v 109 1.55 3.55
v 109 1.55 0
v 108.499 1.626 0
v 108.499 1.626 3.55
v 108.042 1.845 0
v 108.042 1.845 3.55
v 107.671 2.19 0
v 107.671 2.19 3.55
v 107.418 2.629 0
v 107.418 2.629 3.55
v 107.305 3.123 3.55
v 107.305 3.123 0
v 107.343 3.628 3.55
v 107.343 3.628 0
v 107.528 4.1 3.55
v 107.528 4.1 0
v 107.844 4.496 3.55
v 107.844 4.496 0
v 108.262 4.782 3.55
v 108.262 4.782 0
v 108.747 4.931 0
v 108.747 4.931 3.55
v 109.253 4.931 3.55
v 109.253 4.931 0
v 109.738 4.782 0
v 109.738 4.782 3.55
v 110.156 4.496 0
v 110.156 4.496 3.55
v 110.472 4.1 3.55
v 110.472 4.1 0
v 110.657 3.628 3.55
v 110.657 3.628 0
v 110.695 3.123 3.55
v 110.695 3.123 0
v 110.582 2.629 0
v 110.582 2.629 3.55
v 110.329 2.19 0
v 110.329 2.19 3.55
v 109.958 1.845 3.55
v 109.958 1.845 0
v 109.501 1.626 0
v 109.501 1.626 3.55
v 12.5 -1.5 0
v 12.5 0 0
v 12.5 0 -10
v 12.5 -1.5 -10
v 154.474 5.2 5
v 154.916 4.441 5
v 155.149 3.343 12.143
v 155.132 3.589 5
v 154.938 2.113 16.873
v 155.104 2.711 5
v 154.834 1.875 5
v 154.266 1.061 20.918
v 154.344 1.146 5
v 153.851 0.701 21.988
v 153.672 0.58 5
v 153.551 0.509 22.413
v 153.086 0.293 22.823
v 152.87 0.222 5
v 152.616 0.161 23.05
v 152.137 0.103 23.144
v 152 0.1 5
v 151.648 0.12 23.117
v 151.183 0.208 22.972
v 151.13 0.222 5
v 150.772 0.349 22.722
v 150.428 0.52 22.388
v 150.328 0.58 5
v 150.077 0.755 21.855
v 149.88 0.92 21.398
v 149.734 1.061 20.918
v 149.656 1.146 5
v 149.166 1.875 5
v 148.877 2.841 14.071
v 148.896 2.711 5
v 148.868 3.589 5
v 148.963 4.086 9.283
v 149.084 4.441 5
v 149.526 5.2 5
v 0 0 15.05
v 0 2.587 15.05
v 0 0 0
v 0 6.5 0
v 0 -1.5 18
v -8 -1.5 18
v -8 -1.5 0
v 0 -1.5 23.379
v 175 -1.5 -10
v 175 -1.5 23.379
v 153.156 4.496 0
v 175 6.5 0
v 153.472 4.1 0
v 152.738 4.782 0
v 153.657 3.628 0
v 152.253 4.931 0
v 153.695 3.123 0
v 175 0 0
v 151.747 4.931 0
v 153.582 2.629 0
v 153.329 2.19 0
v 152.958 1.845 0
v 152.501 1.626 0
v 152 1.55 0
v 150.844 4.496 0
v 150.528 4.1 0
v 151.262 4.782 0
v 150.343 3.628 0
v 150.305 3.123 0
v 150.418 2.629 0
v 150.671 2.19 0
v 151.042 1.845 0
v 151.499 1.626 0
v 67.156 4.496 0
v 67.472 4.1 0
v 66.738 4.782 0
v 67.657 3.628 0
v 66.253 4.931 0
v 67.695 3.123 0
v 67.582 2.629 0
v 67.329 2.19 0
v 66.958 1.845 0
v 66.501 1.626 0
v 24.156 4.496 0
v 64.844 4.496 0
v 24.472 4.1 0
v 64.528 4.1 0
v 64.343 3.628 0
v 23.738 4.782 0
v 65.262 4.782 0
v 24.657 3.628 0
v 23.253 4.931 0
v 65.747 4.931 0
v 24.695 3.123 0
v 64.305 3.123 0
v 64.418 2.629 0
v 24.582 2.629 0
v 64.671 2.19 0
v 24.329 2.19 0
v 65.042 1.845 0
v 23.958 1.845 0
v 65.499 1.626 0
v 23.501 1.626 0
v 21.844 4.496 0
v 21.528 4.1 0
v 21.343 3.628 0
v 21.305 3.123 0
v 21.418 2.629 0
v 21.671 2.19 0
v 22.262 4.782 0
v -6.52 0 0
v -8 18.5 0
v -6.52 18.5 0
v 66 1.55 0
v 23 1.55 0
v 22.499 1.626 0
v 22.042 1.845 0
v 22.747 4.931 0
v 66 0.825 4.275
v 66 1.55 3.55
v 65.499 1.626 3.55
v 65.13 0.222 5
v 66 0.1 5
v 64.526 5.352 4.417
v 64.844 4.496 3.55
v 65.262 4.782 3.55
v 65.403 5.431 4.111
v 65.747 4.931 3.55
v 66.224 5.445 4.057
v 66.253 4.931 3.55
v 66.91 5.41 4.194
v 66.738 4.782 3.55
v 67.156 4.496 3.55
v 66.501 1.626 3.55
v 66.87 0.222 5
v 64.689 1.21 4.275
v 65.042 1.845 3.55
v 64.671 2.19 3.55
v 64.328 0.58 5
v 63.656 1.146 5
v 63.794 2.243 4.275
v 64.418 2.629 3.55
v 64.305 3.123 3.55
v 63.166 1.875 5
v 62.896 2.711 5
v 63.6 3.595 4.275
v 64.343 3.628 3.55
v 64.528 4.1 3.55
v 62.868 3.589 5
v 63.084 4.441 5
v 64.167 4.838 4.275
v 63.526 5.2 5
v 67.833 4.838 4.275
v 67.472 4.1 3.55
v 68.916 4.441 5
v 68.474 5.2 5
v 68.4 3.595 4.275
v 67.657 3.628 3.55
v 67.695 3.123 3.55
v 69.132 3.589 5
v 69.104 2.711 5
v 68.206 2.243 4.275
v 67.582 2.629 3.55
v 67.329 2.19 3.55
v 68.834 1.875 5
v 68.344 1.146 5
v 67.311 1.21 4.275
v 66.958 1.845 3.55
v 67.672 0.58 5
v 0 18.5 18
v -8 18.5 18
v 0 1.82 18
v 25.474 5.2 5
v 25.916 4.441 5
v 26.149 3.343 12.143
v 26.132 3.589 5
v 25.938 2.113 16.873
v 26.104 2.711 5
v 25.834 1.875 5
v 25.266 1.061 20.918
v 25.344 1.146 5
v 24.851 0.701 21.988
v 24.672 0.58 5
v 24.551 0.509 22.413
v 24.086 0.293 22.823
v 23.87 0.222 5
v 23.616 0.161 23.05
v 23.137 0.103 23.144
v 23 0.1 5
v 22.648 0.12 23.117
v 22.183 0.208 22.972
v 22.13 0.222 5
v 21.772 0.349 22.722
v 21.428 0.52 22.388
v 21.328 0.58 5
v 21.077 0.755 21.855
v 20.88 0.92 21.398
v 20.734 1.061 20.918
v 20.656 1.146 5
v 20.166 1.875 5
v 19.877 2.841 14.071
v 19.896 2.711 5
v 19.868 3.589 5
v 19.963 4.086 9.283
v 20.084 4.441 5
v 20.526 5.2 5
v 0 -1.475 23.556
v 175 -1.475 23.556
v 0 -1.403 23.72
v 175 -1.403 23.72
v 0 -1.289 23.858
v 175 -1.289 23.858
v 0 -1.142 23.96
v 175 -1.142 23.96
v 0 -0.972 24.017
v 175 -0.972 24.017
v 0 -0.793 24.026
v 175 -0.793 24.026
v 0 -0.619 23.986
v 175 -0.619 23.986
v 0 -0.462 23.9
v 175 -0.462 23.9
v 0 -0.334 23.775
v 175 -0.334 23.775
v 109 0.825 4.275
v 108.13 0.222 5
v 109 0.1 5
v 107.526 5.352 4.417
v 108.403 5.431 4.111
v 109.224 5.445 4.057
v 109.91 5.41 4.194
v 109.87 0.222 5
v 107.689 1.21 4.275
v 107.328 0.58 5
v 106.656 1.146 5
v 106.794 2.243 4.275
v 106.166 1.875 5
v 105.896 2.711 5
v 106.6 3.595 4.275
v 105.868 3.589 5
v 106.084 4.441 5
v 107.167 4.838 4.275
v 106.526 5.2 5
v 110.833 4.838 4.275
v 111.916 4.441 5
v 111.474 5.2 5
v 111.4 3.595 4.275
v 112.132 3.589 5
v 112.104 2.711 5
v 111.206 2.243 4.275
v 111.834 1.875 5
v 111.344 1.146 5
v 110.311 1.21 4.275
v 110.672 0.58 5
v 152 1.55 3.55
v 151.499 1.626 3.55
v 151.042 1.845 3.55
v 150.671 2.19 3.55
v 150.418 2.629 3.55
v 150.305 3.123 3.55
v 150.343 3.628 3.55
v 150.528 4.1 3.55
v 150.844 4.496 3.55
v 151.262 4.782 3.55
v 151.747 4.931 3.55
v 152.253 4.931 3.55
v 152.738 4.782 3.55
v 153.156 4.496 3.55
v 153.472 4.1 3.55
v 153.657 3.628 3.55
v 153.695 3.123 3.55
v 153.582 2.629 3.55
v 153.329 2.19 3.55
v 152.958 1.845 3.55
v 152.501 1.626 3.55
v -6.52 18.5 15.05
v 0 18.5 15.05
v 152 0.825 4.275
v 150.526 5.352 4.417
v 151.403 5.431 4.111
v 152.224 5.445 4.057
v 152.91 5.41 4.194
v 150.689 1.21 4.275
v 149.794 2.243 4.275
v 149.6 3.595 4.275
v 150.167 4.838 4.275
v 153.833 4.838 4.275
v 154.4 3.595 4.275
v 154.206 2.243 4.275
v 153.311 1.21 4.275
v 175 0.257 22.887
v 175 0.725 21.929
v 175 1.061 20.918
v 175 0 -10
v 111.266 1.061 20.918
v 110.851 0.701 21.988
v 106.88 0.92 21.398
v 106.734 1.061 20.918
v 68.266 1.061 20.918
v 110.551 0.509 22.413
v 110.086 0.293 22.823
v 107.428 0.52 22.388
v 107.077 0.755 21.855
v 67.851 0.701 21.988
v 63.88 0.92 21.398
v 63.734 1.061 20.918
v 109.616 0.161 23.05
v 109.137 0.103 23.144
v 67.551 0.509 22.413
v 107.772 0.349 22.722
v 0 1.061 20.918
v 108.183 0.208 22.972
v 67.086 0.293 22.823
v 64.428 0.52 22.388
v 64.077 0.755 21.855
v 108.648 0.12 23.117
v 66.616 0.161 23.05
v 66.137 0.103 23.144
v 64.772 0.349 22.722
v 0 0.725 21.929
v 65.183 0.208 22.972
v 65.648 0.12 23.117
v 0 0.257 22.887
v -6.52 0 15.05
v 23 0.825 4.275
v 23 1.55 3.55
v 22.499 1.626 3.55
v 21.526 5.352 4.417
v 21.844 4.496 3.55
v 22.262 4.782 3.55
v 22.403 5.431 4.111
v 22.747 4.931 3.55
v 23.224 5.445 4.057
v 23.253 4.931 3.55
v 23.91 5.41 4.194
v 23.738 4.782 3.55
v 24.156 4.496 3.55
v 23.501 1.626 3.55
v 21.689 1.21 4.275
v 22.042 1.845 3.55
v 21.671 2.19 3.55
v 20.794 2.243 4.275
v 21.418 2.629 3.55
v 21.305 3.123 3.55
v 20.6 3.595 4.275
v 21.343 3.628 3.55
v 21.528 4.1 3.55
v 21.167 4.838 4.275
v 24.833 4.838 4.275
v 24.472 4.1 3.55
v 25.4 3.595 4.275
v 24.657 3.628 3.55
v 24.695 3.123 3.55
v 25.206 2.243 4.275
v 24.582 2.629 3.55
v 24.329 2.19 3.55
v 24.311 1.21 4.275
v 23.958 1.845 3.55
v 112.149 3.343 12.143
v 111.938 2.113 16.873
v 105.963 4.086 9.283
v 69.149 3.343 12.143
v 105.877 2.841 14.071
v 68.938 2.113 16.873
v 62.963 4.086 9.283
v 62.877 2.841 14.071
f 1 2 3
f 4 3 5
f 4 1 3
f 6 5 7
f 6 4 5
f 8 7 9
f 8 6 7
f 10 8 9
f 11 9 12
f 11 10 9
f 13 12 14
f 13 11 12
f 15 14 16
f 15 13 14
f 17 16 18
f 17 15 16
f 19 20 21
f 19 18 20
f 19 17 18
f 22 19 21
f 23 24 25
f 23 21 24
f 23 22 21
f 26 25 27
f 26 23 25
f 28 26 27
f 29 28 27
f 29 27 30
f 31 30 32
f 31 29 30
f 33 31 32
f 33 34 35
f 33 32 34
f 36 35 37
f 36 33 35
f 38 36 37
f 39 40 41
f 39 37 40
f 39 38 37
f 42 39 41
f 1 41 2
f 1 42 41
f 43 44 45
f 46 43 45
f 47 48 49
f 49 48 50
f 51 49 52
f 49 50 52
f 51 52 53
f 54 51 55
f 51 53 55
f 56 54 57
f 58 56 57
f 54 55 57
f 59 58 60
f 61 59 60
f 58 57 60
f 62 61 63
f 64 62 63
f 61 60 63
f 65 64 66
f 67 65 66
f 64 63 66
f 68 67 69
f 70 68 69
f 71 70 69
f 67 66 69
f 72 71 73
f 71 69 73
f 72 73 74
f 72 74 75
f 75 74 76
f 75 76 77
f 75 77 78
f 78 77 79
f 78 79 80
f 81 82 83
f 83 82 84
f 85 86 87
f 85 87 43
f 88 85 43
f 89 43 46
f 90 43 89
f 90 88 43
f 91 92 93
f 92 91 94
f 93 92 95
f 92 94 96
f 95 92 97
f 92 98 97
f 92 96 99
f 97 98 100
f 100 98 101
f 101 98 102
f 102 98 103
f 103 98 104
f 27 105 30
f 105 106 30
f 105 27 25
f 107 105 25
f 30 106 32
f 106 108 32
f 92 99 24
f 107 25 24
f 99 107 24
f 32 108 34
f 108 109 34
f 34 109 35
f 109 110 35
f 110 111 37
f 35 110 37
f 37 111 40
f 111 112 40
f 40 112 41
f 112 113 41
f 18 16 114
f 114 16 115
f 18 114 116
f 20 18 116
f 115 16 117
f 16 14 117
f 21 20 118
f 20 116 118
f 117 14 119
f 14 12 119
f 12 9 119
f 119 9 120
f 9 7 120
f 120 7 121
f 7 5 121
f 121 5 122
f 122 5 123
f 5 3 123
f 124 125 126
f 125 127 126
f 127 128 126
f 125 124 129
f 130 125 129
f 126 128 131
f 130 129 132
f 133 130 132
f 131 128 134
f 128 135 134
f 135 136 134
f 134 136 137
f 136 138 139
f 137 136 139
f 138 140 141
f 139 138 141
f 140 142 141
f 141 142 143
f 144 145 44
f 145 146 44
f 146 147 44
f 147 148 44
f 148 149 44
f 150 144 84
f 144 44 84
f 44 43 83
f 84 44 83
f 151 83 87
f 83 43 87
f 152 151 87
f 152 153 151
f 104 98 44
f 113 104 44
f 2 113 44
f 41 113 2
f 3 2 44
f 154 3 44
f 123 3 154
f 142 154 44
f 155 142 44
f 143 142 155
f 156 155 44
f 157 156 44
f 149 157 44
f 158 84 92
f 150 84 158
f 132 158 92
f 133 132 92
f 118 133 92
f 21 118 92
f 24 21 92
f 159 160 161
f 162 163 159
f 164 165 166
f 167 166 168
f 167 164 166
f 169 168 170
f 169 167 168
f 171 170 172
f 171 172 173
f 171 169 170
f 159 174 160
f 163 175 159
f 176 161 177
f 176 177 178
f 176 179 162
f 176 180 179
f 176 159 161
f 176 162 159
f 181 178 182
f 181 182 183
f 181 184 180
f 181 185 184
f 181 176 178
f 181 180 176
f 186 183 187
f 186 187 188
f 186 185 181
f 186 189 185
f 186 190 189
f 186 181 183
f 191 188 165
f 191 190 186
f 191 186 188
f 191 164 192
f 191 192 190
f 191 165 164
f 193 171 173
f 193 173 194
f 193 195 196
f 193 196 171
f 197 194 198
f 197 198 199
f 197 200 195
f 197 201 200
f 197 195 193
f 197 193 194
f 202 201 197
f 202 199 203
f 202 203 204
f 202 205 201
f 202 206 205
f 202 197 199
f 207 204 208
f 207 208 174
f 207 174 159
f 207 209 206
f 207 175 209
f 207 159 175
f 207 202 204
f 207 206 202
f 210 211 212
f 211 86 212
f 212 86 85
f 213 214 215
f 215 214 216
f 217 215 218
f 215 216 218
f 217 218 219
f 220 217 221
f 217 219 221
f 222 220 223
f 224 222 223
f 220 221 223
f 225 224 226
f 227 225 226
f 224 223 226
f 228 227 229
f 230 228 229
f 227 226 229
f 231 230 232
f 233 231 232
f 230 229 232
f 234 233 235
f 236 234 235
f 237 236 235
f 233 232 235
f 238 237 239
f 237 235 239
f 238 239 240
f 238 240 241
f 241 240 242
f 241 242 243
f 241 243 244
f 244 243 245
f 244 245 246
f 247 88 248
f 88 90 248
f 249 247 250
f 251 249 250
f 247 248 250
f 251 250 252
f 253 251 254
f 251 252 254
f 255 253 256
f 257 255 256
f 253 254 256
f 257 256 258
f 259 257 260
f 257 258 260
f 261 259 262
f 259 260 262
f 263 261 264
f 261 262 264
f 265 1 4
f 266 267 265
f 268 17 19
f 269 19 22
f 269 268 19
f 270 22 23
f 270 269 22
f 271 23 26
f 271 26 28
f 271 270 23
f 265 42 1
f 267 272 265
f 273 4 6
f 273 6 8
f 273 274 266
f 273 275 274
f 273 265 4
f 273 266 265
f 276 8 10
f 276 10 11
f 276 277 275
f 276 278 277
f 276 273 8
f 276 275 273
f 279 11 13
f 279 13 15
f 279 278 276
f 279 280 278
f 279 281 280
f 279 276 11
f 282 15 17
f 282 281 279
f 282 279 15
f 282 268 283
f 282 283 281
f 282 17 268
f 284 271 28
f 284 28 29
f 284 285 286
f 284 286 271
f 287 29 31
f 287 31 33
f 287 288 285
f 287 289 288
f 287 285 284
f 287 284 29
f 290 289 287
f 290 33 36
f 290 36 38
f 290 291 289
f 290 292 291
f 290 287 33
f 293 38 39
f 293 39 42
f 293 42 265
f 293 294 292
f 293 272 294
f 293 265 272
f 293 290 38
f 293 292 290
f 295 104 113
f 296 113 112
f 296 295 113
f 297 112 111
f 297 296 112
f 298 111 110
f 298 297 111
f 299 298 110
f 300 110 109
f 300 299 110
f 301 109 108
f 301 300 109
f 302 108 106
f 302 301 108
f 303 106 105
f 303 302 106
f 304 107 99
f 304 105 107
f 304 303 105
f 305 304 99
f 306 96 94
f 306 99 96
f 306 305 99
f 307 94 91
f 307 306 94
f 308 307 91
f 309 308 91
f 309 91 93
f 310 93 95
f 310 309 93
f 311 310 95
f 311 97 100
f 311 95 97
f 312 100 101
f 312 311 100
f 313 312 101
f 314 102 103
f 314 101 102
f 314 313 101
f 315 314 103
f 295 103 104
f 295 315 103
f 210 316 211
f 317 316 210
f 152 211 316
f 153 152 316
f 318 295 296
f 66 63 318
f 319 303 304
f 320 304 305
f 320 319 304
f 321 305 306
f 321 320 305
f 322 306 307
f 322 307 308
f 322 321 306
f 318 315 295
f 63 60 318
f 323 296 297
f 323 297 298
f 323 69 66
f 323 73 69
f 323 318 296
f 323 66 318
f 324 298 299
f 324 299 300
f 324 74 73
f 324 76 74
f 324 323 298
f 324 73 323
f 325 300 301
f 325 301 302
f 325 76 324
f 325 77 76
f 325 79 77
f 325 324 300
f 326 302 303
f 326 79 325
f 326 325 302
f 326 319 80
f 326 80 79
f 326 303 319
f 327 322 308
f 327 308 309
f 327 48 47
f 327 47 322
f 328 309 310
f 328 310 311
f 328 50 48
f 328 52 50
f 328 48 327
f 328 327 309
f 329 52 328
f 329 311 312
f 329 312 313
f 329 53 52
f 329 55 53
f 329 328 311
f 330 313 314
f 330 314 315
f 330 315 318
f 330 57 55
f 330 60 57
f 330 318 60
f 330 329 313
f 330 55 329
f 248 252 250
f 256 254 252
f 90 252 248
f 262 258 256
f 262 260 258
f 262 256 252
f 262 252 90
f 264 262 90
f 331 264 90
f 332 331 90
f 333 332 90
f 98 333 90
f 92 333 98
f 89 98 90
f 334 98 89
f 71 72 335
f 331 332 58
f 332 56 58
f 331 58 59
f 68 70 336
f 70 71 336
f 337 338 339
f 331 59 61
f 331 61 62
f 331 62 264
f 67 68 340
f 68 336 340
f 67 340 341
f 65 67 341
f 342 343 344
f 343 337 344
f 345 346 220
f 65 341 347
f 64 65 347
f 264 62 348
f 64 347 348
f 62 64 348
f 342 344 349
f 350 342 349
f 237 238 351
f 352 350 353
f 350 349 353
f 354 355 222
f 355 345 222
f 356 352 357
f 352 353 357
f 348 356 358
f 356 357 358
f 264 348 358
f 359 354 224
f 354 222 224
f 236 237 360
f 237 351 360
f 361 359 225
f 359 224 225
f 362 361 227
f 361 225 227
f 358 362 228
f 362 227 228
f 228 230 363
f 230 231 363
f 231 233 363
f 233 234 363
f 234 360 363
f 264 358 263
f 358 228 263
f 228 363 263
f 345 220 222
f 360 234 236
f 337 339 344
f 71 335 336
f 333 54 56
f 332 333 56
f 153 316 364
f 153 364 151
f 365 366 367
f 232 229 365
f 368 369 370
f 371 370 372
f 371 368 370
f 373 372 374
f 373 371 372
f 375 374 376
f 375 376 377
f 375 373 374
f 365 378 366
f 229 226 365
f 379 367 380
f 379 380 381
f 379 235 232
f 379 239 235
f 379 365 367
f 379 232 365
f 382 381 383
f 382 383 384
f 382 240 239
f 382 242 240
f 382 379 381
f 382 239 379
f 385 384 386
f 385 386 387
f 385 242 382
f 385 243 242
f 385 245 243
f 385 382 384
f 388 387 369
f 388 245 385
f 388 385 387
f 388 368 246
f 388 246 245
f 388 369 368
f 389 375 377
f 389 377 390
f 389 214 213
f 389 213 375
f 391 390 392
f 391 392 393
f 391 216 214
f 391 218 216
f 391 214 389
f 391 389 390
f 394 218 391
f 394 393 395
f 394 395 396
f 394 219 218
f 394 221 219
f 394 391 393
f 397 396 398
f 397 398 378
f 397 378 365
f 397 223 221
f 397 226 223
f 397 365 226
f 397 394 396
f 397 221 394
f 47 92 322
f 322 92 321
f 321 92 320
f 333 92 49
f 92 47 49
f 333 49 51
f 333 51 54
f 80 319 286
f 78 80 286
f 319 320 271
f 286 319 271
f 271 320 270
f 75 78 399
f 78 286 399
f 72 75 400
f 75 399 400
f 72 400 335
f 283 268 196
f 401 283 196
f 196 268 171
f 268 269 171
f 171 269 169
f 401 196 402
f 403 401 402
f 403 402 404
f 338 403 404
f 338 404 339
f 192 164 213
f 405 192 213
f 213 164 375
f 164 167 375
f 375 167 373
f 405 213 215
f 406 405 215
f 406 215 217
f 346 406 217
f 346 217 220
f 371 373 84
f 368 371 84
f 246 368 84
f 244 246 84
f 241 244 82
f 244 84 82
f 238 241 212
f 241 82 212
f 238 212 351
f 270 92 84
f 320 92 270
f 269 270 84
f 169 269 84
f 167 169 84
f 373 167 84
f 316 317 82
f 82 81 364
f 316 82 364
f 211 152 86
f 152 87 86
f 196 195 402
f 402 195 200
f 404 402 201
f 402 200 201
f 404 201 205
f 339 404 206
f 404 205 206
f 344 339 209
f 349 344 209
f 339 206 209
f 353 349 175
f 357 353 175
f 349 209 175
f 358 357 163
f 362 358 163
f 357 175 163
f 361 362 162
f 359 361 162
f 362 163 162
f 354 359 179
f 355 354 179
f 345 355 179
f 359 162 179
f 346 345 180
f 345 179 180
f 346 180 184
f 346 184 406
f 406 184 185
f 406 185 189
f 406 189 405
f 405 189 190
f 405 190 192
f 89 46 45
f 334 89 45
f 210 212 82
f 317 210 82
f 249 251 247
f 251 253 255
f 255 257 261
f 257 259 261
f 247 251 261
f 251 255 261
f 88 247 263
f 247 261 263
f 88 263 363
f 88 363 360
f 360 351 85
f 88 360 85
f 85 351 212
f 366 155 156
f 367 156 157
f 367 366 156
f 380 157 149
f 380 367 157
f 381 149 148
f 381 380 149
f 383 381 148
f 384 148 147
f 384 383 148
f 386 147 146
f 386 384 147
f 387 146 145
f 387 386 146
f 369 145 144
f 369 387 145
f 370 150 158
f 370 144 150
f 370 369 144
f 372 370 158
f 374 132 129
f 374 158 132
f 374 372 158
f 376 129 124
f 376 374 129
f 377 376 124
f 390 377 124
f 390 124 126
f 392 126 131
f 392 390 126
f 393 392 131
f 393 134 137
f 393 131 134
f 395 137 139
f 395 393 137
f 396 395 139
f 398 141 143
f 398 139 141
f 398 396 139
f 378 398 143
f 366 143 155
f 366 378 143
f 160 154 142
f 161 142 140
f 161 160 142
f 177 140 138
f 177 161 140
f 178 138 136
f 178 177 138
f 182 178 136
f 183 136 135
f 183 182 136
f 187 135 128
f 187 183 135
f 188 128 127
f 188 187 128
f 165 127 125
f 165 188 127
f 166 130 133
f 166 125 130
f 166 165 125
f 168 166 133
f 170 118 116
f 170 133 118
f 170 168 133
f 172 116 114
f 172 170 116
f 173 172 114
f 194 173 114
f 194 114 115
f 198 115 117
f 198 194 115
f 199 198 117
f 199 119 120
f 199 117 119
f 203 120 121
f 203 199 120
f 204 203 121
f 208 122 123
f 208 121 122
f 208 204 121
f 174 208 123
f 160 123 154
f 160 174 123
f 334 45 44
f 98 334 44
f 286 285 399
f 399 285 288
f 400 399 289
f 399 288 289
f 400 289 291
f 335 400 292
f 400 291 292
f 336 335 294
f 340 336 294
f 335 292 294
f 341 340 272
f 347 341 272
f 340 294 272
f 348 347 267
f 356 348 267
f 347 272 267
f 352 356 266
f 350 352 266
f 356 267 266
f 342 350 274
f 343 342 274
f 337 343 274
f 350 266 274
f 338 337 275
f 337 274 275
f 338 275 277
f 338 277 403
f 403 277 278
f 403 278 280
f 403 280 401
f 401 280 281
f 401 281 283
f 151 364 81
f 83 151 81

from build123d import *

# Parameters (mm, degrees)
BOSS_EXTRUDE1_DEPTH                          = 175
FILLET1_R                                    = 8
CSK_FOR_M3_COUNTERSUNK_FLAT_HEAD_SCR_2_COUNT = 2
CSK_FOR_M3_COUNTERSUNK_FLAT_HEAD_SCR_2_PITCH = 129
CSK_FOR_M3_COUNTERSUNK_FLAT_HEAD_SCR_3_COUNT = 2
CSK_FOR_M3_COUNTERSUNK_FLAT_HEAD_SCR_3_PITCH = 86
CSK_FOR_M3_COUNTERSUNK_FLAT_HEAD_SCR_4_COUNT = 2
CSK_FOR_M3_COUNTERSUNK_FLAT_HEAD_SCR_4_PITCH = 43
CUT_EXTRUDE2_DEPTH                           = 177.259042321
SKETCH8_W                                    = 12.5
SKETCH8_H                                    = 10
CUT_EXTRUDE3_DEPTH                           = 177.896156092
SKETCH10_W                                   = 8
SKETCH10_H                                   = 18
BOSS_EXTRUDE2_DEPTH                          = 1.5
BOSS_EXTRUDE3_DEPTH                          = 18.5
FILLET2_R                                    = 0.65


with BuildPart() as part:
    # Sketch1 → Boss-Extrude1 (new body)
    with BuildSketch(Plane(origin=(0, 0, 0), x_dir=(0, 0, -1), z_dir=(1, 0, 0))):
        Polygon((0, 6.5), (-25, 0), (-25, -1.5), (10, -1.5), (10, 0), (0, 0), align=None)
    extrude(amount=BOSS_EXTRUDE1_DEPTH)

    # Fillet1
    # the kernel refuses this fillet: 8 mm, written as the material it takes off along each edge
    with BuildSketch(Plane(origin=(-10.545555265, 0, 25), x_dir=(0, 0.2516338517649508, -0.967822506788272), z_dir=(1, 0, 0))) as fillet1_piece_1:
        with BuildLine():
            CenterArc((4.218222106, -8), FILLET1_R, 90, 35.061762164)
            Line((-0.377450778, -1.45173376), (-0.469364235, -1.320768435))
            ThreePointArc((-0.469364235, -1.320768435), (-0.34357699, -0.685605464), (-0.154851601, 0.040261416))
            Line((-0.154851601, 0.040261416), (0, 0.16))
            Line((0, 0.16), (4.218222106, 0.16))
            Line((4.218222106, 0.16), (4.218222106, 0))
        make_face()
    extrude(amount=196.091110529, mode=Mode.SUBTRACT)

    # Sketch5 → CSK for M3 Countersunk Flat Head Screw1 (revolve, cut)
    with BuildSketch(Plane(origin=(152, 3.25, 5), x_dir=(0, -1, 0), z_dir=(1, 0, 0))):
        Polygon((0, 0), (0, 15), (1.7, 15), (1.7, 1.45), (3.15, 0), align=None)
    csk_for_m3_countersunk_flat_head_screw1 = revolve(axis=Axis((152, 3.25, 11.35), (0, 0, -1)), mode=Mode.SUBTRACT)

    # CSK for M3 Countersunk Flat Head Scr 2: CSK for M3 Countersunk Flat Head Screw1 ×2
    with Locations(*[(-i * CSK_FOR_M3_COUNTERSUNK_FLAT_HEAD_SCR_2_PITCH, 0, 0) for i in range(1, CSK_FOR_M3_COUNTERSUNK_FLAT_HEAD_SCR_2_COUNT)]):
        add(csk_for_m3_countersunk_flat_head_screw1, mode=Mode.SUBTRACT)

    # CSK for M3 Countersunk Flat Head Scr 3: CSK for M3 Countersunk Flat Head Screw1 ×2
    with Locations(*[(-i * CSK_FOR_M3_COUNTERSUNK_FLAT_HEAD_SCR_3_PITCH, 0, 0) for i in range(1, CSK_FOR_M3_COUNTERSUNK_FLAT_HEAD_SCR_3_COUNT)]):
        add(csk_for_m3_countersunk_flat_head_screw1, mode=Mode.SUBTRACT)

    # CSK for M3 Countersunk Flat Head Scr 4: CSK for M3 Countersunk Flat Head Screw1 ×2
    with Locations(*[(-i * CSK_FOR_M3_COUNTERSUNK_FLAT_HEAD_SCR_4_PITCH, 0, 0) for i in range(1, CSK_FOR_M3_COUNTERSUNK_FLAT_HEAD_SCR_4_COUNT)]):
        add(csk_for_m3_countersunk_flat_head_screw1, mode=Mode.SUBTRACT)

    # Sketch7 → Cut-Extrude2 (cut, through all)
    with BuildSketch(Plane(origin=(0, 0, 5), x_dir=(-1, 0, 0), z_dir=(0, 0, -1))):
        with BuildLine():
            Line((-149.526136625, 5.2), (-154.473863375, 5.2))
            ThreePointArc((-154.473863375, 5.2), (-152, 0.1), (-149.526136625, 5.2))
        make_face()
        with BuildLine():
            Line((-20.526136625, 5.2), (-25.473863375, 5.2))
            ThreePointArc((-25.473863375, 5.2), (-23, 0.1), (-20.526136625, 5.2))
        make_face()
        with BuildLine():
            Line((-63.526136625, 5.2), (-68.473863375, 5.2))
            ThreePointArc((-68.473863375, 5.2), (-66, 0.1), (-63.526136625, 5.2))
        make_face()
        with BuildLine():
            Line((-106.526136625, 5.2), (-111.473863375, 5.2))
            ThreePointArc((-111.473863375, 5.2), (-109, 0.1), (-106.526136625, 5.2))
        make_face()
    extrude(amount=-CUT_EXTRUDE2_DEPTH, mode=Mode.SUBTRACT)

    # Sketch8 → Cut-Extrude3 (cut, through all)
    with BuildSketch(Plane(origin=(0, 0, 0), x_dir=(1, 0, 0), z_dir=(0, 1, 0))):
        with Locations((6.25, 5)):
            Rectangle(SKETCH8_W, SKETCH8_H)
    extrude(amount=-CUT_EXTRUDE3_DEPTH, mode=Mode.SUBTRACT)

    # Sketch10 → Boss-Extrude2 (add)
    with BuildSketch(Plane.XZ.offset(1.5)):
        with Locations((-4, 9)):
            Rectangle(SKETCH10_W, SKETCH10_H)
    extrude(amount=-BOSS_EXTRUDE2_DEPTH)

    # Sketch11 → Boss-Extrude3 (add)
    with BuildSketch(Plane(origin=(0, 0, 0), x_dir=(1, 0, 0), z_dir=(0, 1, 0))):
        Polygon((-6.52, -15.05), (-6.52, 0), (-8, 0), (-8, -18), (0, -18), (0, -15.05), align=None)
    extrude(amount=BOSS_EXTRUDE3_DEPTH)

    # Fillet2
    fillet2_edges = [part.edges().sort_by_distance(p)[0] for p in [
        (87.5, -1.5, 25),
    ]]
    fillet(fillet2_edges, radius=FILLET2_R)


solid = part.part
